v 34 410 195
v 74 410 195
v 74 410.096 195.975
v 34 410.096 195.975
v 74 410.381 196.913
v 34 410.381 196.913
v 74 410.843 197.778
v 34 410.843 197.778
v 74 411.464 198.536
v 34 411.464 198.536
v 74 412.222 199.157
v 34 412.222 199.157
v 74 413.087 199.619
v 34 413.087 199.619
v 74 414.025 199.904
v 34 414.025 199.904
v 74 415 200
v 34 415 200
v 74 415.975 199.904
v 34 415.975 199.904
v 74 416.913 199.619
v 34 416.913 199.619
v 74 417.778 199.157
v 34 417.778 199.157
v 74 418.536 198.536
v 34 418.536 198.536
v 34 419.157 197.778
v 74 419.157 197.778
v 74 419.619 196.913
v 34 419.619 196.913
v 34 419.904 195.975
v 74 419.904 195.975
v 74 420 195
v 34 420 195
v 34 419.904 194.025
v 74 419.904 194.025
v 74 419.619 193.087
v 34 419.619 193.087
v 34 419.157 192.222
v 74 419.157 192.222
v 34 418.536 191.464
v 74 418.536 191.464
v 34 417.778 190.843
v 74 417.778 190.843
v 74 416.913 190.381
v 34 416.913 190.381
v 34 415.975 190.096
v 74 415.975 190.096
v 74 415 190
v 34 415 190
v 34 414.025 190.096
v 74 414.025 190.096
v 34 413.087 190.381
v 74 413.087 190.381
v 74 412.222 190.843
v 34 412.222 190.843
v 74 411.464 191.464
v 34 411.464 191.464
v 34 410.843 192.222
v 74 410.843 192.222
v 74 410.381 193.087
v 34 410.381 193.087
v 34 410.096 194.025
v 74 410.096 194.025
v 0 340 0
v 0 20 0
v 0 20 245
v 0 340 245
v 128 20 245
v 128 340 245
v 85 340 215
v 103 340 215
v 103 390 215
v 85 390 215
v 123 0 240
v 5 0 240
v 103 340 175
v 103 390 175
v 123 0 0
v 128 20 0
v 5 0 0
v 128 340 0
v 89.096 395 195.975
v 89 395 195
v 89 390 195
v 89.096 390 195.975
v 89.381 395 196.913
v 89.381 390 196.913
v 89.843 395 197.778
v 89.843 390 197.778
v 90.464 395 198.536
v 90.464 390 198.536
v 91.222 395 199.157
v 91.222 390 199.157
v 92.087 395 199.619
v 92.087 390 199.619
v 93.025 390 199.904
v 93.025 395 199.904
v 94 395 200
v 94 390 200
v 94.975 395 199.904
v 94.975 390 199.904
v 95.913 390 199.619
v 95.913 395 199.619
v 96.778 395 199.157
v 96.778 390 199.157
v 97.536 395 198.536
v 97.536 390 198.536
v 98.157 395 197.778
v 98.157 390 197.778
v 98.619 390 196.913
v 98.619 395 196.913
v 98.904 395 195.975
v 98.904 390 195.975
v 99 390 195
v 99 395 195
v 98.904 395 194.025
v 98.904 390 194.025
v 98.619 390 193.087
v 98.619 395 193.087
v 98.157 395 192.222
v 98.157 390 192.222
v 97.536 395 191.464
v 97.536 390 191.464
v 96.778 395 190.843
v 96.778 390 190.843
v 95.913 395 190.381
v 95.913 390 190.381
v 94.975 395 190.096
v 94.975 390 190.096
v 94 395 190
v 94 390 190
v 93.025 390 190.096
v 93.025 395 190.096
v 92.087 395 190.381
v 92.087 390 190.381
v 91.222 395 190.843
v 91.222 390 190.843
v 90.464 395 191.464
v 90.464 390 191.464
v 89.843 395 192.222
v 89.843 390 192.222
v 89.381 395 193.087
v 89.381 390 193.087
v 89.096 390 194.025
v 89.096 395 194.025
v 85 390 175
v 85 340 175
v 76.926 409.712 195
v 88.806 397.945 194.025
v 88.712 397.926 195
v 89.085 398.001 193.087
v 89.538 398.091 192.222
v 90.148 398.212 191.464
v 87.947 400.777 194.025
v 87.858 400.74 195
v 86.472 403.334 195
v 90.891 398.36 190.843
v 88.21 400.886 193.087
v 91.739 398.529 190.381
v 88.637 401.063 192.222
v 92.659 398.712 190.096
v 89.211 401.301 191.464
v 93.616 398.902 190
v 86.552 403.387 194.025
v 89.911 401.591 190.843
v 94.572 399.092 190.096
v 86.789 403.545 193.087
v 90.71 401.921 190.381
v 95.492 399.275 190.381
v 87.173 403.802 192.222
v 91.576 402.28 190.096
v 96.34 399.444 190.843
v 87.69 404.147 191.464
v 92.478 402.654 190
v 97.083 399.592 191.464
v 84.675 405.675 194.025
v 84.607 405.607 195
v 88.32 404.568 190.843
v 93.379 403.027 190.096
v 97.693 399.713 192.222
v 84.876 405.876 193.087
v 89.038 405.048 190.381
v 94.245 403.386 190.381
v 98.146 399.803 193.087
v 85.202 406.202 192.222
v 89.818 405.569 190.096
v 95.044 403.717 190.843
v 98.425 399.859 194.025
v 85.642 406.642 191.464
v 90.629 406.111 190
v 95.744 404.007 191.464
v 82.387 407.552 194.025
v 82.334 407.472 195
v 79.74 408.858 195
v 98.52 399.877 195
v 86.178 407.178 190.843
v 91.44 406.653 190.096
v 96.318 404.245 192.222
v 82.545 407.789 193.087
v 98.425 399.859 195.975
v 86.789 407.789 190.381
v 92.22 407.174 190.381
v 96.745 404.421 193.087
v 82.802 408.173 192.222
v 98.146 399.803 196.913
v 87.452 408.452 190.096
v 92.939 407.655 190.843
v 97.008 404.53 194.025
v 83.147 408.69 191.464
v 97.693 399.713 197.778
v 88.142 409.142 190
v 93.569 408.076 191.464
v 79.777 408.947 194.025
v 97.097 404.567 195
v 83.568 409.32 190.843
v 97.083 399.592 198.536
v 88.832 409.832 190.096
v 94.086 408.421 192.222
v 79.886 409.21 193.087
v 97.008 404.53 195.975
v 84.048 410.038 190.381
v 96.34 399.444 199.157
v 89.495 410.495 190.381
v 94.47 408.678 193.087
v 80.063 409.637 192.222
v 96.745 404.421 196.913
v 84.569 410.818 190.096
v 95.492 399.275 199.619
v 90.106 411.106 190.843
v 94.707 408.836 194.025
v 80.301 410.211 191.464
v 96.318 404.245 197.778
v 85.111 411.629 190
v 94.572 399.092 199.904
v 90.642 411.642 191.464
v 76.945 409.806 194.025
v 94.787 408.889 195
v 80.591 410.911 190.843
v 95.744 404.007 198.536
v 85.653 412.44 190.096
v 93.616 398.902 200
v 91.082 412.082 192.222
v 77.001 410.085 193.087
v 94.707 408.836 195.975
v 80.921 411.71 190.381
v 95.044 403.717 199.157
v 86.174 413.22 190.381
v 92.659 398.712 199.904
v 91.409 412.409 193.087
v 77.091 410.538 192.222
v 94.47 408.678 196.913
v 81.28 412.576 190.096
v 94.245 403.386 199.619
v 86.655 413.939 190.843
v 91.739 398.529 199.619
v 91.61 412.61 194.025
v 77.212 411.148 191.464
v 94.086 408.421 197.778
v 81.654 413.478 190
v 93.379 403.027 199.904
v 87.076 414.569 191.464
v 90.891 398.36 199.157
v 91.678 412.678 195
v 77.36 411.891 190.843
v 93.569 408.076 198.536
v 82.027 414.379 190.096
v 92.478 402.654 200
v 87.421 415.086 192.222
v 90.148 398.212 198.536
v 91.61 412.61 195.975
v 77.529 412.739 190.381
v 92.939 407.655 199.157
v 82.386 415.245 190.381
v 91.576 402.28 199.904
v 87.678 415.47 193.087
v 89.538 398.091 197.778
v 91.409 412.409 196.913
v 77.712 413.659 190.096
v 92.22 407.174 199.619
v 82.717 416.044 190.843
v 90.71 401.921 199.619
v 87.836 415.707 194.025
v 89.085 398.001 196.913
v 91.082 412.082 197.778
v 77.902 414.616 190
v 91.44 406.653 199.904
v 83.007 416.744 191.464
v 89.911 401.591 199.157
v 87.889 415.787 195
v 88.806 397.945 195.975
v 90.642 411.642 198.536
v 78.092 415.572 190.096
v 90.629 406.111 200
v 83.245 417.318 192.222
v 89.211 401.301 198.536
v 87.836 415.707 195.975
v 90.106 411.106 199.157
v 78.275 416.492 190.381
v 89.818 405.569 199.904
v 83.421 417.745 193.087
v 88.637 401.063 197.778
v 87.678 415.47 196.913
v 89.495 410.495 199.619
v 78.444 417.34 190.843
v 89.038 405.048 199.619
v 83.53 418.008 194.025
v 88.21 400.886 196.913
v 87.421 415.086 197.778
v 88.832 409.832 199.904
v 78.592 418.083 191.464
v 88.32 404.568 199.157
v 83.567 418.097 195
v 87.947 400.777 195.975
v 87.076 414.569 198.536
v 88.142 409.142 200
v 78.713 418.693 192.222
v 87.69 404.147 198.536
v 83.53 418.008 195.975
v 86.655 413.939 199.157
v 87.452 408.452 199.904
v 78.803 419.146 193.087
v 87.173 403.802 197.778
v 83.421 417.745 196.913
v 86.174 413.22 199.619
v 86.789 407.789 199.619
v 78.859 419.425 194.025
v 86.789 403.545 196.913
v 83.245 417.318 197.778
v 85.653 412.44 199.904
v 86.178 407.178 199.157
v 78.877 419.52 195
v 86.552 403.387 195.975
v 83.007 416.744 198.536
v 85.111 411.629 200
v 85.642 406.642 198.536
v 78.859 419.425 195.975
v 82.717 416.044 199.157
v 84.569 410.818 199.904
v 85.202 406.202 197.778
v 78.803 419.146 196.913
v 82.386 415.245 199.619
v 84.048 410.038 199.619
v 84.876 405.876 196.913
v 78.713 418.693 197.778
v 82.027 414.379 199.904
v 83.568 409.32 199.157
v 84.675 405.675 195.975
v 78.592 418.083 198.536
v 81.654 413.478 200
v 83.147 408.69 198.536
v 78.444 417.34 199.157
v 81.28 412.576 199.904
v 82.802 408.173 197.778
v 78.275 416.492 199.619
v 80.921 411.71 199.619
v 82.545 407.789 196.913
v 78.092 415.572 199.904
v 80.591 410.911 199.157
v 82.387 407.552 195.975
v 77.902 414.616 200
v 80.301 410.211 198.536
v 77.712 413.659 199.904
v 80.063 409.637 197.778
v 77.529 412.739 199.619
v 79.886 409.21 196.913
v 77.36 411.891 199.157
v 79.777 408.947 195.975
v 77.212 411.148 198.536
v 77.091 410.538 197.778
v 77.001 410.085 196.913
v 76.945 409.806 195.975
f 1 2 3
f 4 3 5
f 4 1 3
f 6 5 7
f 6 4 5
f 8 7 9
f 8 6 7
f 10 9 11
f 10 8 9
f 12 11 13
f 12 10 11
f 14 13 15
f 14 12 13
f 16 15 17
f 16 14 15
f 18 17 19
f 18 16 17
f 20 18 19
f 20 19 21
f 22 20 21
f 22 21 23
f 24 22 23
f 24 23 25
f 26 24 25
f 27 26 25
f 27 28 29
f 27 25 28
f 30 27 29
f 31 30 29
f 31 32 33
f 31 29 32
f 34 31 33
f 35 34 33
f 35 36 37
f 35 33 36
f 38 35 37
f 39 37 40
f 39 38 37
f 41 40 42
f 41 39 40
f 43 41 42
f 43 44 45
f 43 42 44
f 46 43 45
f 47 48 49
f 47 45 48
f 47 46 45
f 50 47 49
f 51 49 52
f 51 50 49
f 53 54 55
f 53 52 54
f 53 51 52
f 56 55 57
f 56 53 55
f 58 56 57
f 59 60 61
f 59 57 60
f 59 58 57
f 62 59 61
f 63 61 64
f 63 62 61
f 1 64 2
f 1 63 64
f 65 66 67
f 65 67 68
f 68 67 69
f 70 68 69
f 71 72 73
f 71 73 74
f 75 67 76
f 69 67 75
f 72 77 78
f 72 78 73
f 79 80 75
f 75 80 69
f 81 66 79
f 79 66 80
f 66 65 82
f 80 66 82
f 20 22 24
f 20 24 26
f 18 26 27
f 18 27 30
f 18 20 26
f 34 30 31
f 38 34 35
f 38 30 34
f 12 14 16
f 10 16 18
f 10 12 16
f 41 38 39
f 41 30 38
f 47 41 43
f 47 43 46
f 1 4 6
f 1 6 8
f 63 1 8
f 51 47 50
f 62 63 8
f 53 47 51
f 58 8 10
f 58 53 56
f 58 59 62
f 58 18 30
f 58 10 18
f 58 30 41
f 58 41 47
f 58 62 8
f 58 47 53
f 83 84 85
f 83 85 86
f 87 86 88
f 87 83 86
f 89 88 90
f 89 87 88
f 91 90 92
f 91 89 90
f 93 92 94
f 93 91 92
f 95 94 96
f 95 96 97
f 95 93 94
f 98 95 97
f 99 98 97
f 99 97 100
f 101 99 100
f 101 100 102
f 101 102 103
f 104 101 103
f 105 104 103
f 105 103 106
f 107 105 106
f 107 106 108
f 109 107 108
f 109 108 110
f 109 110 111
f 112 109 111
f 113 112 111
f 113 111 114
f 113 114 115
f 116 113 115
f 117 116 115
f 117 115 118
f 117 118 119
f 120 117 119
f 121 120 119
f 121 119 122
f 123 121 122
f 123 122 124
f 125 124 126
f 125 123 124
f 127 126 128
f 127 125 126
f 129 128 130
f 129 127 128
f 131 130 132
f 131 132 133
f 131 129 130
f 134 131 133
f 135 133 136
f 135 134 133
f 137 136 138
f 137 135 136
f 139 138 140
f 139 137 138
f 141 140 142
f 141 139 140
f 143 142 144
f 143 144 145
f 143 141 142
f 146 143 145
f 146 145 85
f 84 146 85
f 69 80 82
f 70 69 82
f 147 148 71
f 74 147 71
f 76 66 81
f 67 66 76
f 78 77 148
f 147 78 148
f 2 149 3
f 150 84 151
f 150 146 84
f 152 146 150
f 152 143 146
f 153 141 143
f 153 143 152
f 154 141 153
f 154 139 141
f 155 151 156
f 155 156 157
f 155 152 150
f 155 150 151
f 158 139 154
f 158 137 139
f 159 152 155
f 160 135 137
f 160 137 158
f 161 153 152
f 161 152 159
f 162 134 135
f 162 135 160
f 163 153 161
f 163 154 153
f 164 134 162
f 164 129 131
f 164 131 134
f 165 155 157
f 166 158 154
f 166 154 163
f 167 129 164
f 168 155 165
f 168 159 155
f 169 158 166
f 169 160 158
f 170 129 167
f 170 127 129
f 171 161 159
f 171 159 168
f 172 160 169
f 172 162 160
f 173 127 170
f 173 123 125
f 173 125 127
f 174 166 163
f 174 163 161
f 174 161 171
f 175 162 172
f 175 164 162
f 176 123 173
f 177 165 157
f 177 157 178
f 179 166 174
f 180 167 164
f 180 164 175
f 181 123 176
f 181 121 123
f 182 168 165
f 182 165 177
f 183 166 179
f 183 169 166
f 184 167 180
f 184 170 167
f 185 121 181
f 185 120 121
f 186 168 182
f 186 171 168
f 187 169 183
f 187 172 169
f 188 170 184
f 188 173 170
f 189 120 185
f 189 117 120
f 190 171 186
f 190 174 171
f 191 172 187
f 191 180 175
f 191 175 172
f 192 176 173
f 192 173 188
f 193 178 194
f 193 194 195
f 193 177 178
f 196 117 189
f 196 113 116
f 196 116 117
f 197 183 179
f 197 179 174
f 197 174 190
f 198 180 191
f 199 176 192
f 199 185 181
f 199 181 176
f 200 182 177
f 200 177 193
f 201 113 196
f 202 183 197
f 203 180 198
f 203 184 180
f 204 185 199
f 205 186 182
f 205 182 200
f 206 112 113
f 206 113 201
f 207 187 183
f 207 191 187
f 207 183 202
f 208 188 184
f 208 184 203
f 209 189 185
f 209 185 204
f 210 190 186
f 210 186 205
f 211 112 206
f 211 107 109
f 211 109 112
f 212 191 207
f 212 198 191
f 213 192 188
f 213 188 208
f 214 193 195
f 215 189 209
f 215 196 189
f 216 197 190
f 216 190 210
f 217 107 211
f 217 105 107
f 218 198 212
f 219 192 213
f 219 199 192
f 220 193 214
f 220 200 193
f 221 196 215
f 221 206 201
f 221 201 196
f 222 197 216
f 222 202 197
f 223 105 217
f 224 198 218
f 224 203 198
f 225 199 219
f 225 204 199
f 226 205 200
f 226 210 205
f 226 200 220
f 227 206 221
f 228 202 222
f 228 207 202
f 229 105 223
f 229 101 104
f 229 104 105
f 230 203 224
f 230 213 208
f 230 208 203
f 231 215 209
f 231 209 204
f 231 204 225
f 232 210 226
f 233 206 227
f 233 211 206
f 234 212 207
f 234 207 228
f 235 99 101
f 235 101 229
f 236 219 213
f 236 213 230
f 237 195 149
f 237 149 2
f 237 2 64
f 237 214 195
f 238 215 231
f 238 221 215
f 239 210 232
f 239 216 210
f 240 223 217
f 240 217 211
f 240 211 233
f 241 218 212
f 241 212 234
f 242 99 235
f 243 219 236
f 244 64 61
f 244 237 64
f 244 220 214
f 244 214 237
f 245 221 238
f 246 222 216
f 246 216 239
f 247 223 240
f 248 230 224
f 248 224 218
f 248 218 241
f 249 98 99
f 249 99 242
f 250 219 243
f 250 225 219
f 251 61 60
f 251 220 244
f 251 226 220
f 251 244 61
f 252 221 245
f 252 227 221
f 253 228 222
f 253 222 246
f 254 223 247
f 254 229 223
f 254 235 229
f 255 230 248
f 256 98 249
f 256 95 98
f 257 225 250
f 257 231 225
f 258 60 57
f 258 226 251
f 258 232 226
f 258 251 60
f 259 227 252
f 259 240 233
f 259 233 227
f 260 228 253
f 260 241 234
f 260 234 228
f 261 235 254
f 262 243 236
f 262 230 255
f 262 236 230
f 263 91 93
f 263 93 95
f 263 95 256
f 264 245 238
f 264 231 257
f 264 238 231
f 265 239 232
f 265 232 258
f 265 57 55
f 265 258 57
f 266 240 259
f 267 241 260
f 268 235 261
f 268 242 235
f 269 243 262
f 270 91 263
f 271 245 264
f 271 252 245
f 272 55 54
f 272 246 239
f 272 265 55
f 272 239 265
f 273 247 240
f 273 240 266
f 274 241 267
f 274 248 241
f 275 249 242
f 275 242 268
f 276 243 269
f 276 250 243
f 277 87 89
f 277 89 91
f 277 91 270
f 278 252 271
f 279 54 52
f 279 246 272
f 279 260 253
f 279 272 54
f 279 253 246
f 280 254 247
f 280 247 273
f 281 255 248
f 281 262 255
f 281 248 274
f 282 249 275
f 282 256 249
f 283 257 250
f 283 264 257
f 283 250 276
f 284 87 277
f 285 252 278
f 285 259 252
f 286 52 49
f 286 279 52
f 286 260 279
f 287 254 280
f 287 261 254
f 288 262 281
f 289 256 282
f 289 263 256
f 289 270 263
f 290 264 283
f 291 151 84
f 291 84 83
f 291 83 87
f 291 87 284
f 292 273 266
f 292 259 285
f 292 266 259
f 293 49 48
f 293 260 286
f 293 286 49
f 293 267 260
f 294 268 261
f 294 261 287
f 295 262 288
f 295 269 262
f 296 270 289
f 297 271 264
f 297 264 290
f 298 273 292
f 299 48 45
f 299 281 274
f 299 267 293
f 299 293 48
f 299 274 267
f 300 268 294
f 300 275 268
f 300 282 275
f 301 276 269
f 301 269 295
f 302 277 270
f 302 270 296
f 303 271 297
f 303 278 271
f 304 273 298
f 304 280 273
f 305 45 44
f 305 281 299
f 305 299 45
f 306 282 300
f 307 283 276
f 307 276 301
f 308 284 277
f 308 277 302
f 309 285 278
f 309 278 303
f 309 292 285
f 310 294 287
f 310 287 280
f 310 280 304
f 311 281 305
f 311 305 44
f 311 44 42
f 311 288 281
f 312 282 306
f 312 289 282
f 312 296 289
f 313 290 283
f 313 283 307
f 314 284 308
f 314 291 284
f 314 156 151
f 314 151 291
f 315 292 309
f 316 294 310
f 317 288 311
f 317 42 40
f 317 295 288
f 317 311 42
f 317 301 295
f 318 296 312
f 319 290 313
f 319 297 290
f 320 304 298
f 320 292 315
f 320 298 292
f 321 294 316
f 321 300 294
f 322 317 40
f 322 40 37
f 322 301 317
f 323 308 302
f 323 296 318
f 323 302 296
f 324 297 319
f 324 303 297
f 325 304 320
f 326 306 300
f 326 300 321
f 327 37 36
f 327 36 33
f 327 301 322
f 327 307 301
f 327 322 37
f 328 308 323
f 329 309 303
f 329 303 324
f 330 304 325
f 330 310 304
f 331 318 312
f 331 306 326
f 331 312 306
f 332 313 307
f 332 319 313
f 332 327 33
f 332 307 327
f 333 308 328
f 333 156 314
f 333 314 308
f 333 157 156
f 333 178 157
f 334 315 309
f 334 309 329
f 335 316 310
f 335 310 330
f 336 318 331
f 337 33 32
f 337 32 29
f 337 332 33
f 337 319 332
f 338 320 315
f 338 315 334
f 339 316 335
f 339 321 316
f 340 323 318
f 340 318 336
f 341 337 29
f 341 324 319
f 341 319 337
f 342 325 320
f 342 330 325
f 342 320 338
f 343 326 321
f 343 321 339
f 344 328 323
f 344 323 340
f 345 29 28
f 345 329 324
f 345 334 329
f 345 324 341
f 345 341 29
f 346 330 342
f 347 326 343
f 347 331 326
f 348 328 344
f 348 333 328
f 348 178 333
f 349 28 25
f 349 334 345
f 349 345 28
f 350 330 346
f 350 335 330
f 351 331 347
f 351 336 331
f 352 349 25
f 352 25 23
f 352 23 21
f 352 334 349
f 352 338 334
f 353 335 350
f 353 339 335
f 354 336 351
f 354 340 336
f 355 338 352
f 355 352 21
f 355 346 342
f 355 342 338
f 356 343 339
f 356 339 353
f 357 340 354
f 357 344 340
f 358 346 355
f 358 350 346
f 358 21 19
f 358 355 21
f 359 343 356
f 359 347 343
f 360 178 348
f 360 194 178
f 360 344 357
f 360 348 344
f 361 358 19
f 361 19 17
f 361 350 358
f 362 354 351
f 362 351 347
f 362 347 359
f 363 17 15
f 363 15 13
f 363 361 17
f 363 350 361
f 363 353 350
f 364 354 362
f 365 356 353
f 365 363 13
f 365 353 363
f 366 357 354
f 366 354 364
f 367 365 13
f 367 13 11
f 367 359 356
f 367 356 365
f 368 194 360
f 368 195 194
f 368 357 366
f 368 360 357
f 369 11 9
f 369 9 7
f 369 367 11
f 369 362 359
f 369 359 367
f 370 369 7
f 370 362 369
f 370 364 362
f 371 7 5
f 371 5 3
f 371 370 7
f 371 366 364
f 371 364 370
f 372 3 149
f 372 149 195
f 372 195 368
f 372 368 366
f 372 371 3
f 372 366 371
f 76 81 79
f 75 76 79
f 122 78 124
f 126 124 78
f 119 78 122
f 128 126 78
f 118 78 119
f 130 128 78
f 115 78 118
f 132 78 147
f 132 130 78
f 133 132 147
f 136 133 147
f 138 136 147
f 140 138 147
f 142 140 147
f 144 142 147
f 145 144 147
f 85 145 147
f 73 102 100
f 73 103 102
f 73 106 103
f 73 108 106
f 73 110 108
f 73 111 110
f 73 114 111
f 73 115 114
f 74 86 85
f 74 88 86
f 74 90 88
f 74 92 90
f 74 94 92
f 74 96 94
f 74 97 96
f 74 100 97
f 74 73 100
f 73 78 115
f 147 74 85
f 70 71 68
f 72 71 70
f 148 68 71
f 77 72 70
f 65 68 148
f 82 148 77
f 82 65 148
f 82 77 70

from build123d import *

# Parameters (mm, degrees)
F0_W     = 128
F0_H     = 340
F1_DEPTH = 245
F2_SIZE2 = 20
F2_SIZE  = 5
F3_W     = 18
F3_H     = 40
F4_DEPTH = 50
F7_R     = 5


with BuildPart() as f1:
    # F0 (on Top) → F1 (new body)
    with BuildSketch(Plane.XY):
        with Locations((64, 170)):
            Rectangle(F0_W, F0_H)
    extrude(amount=F1_DEPTH)

    # F2
    f2_edges = [f1.edges().sort_by_distance(p)[0] for p in [
        (128, 0, 122.5),
        (0, 0, 122.5),
        (64, 0, 245),
    ]]
    f2_side = f1.faces().sort_by_distance((64, 0, 122.5))[0]
    chamfer(f2_edges, length=F2_SIZE, length2=F2_SIZE2, reference=f2_side)

    # F3 (on face) → F4 (join)
    with BuildSketch(Plane(origin=(0, 340, 0), x_dir=(-1, 0, 0), z_dir=(0, 1, 0))):
        with Locations((-94, 195)):
            Rectangle(F3_W, F3_H)
    extrude(amount=F4_DEPTH)

    # F8: sweep along a path in F6
    with BuildLine(Plane.XY.offset(195)) as f8_path:
        Line((94, 390), (94, 395))
        ThreePointArc((94, 395), (88.1421356237, 409.1421356237), (74, 415))
        Line((74, 415), (34, 415))
    # F7 (on face) → F8 (sweep)
    with BuildSketch(Plane(origin=(0, 390, 0), x_dir=(-1, 0, 0), z_dir=(0, 1, 0))):
        with Locations((-94, 195)):
            Circle(F7_R)
    sweep(path=f8_path.line)


solid = f1.part
